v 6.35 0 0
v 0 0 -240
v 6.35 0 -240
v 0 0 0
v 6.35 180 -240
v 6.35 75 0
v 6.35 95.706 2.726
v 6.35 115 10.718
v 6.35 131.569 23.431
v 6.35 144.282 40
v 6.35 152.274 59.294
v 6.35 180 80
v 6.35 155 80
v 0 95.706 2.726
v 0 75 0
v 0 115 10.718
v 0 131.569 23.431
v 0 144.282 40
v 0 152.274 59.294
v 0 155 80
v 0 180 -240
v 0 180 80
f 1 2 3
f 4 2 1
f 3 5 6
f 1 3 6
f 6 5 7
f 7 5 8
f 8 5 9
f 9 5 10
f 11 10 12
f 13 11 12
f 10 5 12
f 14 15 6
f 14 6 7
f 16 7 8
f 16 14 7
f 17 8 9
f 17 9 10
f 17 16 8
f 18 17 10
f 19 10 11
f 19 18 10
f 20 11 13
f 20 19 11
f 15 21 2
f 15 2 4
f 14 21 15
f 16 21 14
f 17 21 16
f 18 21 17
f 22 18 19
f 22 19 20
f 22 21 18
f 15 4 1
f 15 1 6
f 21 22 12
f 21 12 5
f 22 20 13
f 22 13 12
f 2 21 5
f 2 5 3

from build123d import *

# Parameters (mm, degrees)
BOSS_EXTRUDE1_DEPTH = 6.35


with BuildPart() as part:
    # Sketch1 → Boss-Extrude1 (new body)
    with BuildSketch(Plane(origin=(0, 0, 0), x_dir=(0, 0, -1), z_dir=(1, 0, 0))):
        with BuildLine():
            Line((0, 0), (0, 75))
            ThreePointArc((0, 75), (-23.431457505, 131.568542495), (-80, 155))
            Line((-80, 155), (-80, 180))
            Line((-80, 180), (240, 180))
            Line((240, 180), (240, 0))
            Line((240, 0), (0, 0))
        make_face()
    extrude(amount=BOSS_EXTRUDE1_DEPTH)


solid = part.part
